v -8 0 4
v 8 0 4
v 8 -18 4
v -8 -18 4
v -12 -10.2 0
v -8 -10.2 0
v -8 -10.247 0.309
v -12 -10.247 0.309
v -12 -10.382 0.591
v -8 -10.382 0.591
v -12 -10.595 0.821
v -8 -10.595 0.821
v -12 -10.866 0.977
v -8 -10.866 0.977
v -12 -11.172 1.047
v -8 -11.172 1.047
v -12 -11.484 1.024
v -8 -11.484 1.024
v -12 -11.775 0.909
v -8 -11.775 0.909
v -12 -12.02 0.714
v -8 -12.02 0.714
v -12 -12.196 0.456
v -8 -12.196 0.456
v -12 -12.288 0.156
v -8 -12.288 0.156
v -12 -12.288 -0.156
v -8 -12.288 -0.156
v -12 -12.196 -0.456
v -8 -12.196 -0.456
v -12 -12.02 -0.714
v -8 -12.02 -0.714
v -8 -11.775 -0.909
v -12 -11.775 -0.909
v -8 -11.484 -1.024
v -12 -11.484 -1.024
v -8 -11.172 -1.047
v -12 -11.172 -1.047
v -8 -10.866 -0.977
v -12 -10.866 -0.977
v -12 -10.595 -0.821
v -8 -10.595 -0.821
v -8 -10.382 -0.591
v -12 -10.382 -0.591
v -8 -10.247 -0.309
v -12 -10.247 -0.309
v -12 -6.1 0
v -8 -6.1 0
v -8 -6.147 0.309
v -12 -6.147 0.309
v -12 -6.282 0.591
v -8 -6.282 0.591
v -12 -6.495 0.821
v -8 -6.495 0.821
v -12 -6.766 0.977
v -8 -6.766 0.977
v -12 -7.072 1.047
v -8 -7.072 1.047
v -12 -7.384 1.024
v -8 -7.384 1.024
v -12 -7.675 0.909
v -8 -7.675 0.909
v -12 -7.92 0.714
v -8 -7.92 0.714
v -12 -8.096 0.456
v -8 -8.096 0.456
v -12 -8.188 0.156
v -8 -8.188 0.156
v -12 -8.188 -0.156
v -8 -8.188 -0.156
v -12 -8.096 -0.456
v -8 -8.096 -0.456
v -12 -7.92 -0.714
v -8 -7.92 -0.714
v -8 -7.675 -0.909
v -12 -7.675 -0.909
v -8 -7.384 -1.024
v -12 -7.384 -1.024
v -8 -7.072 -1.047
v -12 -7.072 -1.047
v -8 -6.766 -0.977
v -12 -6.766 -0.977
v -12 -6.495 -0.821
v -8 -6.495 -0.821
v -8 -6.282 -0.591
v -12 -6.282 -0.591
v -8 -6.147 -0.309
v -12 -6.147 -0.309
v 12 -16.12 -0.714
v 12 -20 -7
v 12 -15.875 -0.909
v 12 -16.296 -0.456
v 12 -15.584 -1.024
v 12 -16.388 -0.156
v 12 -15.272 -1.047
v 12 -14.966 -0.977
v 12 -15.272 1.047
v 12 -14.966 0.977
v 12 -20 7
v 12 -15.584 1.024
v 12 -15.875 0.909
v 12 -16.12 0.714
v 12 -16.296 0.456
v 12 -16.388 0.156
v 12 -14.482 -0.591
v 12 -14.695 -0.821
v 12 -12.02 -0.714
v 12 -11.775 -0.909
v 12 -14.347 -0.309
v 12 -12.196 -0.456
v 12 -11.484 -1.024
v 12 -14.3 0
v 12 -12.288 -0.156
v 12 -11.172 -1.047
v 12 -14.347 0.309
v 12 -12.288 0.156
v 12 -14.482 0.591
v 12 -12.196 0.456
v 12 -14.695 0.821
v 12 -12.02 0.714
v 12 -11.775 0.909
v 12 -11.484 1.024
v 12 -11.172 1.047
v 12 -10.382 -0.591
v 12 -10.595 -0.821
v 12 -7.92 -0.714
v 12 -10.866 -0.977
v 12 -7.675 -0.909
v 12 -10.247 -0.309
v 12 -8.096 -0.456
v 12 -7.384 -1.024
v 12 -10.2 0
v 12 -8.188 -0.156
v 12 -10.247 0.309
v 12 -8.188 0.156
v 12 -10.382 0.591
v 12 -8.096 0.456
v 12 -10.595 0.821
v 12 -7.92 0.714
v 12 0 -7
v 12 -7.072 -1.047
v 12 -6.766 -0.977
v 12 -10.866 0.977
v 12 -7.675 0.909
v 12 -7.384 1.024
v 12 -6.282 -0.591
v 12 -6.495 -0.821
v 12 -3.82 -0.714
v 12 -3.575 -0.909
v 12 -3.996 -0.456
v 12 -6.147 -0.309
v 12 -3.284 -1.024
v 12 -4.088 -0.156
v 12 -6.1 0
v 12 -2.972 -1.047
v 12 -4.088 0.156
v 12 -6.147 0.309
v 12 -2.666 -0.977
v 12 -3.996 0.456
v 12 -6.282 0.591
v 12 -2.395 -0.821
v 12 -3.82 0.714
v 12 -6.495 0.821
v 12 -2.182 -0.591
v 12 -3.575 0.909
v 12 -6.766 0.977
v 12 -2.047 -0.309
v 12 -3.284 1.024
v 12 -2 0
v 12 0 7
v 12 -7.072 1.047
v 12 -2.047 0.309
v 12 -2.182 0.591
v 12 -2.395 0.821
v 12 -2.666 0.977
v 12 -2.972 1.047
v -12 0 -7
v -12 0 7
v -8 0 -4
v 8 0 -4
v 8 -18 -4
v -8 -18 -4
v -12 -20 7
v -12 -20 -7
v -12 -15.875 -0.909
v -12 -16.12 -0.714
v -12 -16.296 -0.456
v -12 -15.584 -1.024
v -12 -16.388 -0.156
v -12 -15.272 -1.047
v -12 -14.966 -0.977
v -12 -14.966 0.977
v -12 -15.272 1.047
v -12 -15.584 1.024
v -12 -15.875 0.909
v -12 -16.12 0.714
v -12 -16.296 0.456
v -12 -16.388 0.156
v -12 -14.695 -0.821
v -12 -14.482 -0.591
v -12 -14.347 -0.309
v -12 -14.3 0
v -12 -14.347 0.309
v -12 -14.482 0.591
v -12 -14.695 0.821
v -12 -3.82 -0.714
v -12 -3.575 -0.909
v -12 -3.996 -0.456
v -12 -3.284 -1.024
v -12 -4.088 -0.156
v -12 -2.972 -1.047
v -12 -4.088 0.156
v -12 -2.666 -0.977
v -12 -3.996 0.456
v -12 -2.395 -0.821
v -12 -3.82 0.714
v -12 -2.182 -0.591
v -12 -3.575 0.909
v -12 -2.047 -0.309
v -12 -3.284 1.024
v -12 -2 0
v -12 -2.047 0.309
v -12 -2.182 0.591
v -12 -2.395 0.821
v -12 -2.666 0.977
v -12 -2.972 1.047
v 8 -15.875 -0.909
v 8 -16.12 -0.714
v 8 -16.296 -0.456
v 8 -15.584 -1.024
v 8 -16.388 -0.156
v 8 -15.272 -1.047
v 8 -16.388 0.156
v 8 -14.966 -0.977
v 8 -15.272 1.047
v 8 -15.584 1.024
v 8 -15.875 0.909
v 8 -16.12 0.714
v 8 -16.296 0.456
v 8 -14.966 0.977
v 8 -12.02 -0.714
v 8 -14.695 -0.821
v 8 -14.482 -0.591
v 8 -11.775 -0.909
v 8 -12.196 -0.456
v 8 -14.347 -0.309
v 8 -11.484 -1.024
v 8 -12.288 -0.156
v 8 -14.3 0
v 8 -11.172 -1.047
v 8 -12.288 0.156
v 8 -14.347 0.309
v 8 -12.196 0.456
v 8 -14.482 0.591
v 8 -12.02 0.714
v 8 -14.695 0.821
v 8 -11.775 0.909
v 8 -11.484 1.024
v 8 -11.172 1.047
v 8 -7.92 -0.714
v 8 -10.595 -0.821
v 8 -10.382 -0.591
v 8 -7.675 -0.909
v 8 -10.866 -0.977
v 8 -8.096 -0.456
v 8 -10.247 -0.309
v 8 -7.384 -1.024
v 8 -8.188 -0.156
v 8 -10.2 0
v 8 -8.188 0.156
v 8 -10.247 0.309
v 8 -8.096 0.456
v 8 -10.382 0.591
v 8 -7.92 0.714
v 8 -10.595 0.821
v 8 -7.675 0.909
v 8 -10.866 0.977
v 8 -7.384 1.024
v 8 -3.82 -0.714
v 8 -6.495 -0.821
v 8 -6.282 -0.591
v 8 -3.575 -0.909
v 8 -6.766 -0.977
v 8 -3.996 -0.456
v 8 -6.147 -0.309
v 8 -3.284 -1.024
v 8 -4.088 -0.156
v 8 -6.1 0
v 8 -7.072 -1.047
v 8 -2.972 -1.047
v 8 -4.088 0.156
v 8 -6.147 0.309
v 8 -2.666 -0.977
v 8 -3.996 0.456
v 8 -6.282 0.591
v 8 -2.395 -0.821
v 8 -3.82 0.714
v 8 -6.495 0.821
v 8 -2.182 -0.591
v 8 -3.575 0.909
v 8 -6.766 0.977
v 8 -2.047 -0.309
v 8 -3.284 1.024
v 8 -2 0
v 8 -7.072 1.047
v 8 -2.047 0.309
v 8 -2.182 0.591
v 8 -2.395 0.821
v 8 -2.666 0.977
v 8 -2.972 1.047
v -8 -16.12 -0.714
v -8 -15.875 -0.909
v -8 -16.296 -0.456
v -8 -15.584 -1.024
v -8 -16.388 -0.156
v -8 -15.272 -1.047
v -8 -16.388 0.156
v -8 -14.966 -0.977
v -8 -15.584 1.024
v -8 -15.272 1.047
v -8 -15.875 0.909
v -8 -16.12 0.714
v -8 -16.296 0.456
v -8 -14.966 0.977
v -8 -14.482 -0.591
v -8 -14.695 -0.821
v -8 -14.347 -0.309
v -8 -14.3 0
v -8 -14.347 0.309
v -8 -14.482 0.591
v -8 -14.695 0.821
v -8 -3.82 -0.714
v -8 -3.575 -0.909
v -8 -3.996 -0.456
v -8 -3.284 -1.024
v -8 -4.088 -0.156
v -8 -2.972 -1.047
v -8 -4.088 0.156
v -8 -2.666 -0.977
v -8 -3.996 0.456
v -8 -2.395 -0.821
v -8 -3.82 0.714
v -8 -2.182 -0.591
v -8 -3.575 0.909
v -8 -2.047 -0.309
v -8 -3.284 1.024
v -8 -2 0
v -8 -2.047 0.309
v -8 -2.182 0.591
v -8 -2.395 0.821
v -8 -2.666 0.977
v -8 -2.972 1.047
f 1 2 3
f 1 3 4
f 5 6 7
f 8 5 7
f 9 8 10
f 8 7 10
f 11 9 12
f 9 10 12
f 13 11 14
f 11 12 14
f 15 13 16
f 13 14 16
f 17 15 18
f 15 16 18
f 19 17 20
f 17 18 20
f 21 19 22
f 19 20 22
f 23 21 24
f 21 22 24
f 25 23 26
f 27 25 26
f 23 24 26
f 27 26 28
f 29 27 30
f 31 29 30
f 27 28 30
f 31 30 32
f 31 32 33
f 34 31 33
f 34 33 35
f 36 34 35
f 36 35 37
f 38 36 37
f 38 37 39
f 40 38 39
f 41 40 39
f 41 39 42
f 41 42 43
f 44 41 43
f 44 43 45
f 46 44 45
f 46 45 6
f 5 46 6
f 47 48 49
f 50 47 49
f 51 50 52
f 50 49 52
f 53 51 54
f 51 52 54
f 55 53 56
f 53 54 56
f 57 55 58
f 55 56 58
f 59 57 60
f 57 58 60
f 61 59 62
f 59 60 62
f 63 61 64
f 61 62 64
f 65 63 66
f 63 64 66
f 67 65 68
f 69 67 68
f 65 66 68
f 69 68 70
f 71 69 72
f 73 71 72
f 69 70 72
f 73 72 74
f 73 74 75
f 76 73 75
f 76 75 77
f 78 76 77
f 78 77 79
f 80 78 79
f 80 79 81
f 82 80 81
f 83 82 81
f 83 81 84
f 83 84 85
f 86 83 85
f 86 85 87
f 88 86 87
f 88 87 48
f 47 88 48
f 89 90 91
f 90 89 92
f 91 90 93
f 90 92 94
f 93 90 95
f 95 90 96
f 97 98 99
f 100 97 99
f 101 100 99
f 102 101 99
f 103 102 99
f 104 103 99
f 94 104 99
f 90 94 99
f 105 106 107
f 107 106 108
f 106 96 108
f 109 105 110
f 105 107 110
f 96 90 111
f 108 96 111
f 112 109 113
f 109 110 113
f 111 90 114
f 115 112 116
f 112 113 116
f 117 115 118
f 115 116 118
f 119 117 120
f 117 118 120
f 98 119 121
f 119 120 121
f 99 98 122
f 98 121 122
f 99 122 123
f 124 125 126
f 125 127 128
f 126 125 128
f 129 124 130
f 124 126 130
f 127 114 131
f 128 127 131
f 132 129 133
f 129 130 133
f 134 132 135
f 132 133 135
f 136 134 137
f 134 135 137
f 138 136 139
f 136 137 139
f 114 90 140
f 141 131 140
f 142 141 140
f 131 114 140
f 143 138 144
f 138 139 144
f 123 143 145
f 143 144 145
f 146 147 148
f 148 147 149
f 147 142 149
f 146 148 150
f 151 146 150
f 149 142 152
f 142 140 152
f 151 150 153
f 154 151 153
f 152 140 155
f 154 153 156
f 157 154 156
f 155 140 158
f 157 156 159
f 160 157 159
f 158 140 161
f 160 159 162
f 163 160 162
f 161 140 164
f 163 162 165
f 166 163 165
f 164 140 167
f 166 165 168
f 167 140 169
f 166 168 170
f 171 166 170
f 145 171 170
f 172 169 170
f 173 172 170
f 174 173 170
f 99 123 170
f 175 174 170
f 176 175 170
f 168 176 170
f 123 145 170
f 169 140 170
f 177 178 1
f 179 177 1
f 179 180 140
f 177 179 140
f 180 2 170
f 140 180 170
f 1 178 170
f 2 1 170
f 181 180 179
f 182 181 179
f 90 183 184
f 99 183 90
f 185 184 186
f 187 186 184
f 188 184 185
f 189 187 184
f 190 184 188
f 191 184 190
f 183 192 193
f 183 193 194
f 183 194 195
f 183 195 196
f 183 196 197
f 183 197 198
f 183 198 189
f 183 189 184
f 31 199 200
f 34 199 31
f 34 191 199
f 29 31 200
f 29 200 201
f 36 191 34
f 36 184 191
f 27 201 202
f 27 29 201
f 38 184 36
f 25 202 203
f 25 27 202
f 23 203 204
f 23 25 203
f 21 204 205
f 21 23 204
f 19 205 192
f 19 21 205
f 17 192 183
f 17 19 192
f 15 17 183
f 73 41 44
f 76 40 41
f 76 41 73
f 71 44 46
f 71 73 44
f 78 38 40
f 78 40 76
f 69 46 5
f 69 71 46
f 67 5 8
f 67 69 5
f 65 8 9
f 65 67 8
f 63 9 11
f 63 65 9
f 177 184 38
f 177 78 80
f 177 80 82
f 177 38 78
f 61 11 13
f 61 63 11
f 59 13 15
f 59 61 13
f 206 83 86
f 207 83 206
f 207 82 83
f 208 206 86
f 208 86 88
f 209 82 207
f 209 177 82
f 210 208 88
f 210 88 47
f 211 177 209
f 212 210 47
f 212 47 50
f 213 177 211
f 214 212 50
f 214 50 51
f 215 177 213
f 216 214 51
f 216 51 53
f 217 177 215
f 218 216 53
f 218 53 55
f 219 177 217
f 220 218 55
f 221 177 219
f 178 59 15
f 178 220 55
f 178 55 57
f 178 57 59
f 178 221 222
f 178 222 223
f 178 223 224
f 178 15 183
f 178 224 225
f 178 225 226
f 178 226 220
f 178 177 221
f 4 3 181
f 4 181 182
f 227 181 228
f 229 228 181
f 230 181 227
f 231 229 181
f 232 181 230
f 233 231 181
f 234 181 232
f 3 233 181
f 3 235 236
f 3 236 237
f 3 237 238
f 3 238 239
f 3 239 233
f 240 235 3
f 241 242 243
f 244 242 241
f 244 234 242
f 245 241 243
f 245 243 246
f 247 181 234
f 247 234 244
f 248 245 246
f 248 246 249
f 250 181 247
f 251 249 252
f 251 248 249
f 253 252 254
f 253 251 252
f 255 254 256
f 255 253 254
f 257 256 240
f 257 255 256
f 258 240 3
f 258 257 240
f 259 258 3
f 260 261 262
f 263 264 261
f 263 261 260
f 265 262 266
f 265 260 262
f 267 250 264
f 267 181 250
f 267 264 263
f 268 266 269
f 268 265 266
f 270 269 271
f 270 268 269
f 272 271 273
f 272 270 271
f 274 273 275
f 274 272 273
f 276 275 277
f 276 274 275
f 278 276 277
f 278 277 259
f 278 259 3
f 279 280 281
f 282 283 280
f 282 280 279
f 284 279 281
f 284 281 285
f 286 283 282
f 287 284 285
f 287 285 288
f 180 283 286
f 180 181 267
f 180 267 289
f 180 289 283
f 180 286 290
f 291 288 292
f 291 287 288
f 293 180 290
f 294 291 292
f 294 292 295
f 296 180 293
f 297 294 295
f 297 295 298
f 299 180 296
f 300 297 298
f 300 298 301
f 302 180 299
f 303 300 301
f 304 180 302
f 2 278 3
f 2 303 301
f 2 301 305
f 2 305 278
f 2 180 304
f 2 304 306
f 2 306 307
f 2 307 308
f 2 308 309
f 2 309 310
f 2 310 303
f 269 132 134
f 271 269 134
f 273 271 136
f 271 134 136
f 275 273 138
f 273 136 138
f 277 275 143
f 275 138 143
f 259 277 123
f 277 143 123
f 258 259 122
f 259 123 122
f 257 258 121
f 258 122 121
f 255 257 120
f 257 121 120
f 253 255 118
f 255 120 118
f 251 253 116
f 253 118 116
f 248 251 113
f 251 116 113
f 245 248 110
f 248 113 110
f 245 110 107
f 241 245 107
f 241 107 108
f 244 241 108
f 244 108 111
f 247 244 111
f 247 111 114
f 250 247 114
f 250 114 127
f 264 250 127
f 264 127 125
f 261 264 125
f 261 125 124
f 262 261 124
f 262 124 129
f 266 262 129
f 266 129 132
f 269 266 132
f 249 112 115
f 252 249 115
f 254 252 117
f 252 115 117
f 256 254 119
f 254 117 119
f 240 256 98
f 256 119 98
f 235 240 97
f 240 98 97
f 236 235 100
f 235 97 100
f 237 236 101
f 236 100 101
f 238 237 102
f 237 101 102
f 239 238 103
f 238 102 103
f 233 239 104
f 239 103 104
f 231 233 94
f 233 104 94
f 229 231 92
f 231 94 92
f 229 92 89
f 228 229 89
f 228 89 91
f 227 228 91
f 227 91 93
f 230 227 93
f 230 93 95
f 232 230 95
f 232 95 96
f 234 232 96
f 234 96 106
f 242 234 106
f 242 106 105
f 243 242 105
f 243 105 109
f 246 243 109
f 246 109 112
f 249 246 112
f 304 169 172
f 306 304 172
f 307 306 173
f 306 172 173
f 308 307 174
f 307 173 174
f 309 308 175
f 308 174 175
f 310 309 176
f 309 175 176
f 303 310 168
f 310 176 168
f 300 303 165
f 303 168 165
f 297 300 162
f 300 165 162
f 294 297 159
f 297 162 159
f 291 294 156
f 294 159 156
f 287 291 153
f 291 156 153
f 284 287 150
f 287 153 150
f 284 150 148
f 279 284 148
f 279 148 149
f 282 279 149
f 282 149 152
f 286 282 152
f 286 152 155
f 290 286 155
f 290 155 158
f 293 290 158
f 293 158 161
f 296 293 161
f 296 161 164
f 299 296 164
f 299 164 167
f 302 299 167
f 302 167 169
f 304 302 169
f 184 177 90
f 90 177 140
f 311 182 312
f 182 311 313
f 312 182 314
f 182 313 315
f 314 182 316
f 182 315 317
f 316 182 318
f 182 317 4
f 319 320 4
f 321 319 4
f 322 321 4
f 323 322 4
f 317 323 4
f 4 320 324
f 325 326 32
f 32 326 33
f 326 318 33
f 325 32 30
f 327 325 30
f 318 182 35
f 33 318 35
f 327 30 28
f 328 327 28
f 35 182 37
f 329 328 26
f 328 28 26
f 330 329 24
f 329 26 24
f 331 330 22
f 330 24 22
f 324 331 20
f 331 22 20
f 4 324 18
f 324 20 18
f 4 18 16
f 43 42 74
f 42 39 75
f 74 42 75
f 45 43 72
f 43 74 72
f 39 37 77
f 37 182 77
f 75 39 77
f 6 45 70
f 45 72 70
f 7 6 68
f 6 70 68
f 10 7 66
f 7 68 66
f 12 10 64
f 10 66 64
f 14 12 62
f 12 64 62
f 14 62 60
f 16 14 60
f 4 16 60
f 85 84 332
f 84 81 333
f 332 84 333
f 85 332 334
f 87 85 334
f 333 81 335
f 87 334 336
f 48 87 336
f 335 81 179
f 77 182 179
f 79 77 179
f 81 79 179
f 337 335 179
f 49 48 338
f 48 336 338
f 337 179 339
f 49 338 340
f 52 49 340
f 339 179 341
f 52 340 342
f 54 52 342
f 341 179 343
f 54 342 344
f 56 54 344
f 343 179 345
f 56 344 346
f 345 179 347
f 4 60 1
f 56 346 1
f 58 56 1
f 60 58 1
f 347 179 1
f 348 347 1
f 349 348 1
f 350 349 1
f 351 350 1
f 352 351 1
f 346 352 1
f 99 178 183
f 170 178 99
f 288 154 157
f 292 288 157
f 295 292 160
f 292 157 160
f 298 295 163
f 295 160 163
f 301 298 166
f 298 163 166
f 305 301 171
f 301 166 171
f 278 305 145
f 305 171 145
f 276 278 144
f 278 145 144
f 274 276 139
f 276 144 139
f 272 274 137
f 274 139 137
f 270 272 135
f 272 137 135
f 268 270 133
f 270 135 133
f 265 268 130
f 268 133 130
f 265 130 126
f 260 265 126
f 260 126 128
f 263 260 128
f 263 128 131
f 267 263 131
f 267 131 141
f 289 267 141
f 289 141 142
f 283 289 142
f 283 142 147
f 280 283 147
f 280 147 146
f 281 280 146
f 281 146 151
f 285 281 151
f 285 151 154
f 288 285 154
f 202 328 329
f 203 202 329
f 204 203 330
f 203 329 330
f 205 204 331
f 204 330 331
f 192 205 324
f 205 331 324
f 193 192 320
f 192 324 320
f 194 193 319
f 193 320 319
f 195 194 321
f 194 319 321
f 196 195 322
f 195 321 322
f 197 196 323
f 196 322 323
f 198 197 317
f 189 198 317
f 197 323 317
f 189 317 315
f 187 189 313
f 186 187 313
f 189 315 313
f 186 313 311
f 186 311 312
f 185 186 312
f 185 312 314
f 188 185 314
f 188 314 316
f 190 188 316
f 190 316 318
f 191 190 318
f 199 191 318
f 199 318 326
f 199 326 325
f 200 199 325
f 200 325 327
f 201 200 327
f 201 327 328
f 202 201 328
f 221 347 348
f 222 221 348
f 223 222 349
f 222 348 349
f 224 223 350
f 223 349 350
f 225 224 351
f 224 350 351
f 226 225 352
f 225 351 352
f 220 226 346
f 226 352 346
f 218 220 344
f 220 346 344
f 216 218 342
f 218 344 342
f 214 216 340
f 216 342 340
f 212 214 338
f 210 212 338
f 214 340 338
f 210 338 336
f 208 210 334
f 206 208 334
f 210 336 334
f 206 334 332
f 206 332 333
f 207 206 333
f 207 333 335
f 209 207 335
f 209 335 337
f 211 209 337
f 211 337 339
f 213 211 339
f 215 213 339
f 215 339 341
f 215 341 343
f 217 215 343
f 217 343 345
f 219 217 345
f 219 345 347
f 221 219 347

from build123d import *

# Parameters (mm, degrees)
F0_W     = 24
F0_H     = 14
F1_DEPTH = 20
F2_W     = 16
F2_H     = 8
F3_DEPTH = 18
F4_R     = 1.05
F5_DEPTH = 24.001


with BuildPart() as f1:
    # F0 (on Front) → F1 (new body)
    with BuildSketch(Plane.XZ):
        Rectangle(F0_W, F0_H)
    extrude(amount=F1_DEPTH)

    # F2 (on face) → F3 (cut)
    with BuildSketch(Plane(origin=(0, 0, 0), x_dir=(-1, 0, 0), z_dir=(0, 1, 0))):
        Rectangle(F2_W, F2_H)
    extrude(amount=-F3_DEPTH, mode=Mode.SUBTRACT)

    # F4 (on face) → F5 (cut, through all)
    with BuildSketch(Plane.YZ.offset(12)):
        with Locations((-15.35, 0)):
            Circle(F4_R)
        with Locations((-11.25, 0)):
            Circle(F4_R)
        with Locations((-3.05, 0)):
            Circle(F4_R)
        with Locations((-7.15, 0)):
            Circle(F4_R)
    extrude(amount=-F5_DEPTH, mode=Mode.SUBTRACT)


solid = f1.part
